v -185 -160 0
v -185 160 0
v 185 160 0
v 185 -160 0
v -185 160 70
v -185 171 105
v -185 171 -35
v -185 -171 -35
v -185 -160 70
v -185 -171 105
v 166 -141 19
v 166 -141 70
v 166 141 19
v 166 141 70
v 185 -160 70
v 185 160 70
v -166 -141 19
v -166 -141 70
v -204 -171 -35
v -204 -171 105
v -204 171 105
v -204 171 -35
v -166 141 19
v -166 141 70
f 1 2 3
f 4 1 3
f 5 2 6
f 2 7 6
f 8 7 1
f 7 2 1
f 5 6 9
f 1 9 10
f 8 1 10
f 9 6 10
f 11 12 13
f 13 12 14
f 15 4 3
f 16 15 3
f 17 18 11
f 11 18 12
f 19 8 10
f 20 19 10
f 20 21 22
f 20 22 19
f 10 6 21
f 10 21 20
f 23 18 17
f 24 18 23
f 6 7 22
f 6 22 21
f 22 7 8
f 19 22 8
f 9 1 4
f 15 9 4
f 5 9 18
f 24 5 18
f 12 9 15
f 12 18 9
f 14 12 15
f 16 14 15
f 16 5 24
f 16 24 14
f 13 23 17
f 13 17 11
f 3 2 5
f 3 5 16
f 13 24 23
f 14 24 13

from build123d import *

# Parameters (mm, degrees)
F0_W     = 370
F0_H     = 320
F1_DEPTH = 70
F2_W     = 332
F2_H     = 282
F3_DEPTH = 51
F4_W     = 342
F4_H     = 140
F5_DEPTH = 19


with BuildPart() as f1:
    # F0 (on Top) → F1 (new body)
    with BuildSketch(Plane.XY):
        Rectangle(F0_W, F0_H)
    extrude(amount=F1_DEPTH)

    # F2 (on face) → F3 (cut)
    with BuildSketch(Plane.XY.offset(70)):
        Rectangle(F2_W, F2_H)
    extrude(amount=-F3_DEPTH, mode=Mode.SUBTRACT)

    # F4 (on face) → F5 (join)
    with BuildSketch(Plane(origin=(-185, 0, 0), x_dir=(0, -1, 0), z_dir=(-1, 0, 0))):
        with Locations((0, 35)):
            Rectangle(F4_W, F4_H)
    extrude(amount=F5_DEPTH)


solid = f1.part
